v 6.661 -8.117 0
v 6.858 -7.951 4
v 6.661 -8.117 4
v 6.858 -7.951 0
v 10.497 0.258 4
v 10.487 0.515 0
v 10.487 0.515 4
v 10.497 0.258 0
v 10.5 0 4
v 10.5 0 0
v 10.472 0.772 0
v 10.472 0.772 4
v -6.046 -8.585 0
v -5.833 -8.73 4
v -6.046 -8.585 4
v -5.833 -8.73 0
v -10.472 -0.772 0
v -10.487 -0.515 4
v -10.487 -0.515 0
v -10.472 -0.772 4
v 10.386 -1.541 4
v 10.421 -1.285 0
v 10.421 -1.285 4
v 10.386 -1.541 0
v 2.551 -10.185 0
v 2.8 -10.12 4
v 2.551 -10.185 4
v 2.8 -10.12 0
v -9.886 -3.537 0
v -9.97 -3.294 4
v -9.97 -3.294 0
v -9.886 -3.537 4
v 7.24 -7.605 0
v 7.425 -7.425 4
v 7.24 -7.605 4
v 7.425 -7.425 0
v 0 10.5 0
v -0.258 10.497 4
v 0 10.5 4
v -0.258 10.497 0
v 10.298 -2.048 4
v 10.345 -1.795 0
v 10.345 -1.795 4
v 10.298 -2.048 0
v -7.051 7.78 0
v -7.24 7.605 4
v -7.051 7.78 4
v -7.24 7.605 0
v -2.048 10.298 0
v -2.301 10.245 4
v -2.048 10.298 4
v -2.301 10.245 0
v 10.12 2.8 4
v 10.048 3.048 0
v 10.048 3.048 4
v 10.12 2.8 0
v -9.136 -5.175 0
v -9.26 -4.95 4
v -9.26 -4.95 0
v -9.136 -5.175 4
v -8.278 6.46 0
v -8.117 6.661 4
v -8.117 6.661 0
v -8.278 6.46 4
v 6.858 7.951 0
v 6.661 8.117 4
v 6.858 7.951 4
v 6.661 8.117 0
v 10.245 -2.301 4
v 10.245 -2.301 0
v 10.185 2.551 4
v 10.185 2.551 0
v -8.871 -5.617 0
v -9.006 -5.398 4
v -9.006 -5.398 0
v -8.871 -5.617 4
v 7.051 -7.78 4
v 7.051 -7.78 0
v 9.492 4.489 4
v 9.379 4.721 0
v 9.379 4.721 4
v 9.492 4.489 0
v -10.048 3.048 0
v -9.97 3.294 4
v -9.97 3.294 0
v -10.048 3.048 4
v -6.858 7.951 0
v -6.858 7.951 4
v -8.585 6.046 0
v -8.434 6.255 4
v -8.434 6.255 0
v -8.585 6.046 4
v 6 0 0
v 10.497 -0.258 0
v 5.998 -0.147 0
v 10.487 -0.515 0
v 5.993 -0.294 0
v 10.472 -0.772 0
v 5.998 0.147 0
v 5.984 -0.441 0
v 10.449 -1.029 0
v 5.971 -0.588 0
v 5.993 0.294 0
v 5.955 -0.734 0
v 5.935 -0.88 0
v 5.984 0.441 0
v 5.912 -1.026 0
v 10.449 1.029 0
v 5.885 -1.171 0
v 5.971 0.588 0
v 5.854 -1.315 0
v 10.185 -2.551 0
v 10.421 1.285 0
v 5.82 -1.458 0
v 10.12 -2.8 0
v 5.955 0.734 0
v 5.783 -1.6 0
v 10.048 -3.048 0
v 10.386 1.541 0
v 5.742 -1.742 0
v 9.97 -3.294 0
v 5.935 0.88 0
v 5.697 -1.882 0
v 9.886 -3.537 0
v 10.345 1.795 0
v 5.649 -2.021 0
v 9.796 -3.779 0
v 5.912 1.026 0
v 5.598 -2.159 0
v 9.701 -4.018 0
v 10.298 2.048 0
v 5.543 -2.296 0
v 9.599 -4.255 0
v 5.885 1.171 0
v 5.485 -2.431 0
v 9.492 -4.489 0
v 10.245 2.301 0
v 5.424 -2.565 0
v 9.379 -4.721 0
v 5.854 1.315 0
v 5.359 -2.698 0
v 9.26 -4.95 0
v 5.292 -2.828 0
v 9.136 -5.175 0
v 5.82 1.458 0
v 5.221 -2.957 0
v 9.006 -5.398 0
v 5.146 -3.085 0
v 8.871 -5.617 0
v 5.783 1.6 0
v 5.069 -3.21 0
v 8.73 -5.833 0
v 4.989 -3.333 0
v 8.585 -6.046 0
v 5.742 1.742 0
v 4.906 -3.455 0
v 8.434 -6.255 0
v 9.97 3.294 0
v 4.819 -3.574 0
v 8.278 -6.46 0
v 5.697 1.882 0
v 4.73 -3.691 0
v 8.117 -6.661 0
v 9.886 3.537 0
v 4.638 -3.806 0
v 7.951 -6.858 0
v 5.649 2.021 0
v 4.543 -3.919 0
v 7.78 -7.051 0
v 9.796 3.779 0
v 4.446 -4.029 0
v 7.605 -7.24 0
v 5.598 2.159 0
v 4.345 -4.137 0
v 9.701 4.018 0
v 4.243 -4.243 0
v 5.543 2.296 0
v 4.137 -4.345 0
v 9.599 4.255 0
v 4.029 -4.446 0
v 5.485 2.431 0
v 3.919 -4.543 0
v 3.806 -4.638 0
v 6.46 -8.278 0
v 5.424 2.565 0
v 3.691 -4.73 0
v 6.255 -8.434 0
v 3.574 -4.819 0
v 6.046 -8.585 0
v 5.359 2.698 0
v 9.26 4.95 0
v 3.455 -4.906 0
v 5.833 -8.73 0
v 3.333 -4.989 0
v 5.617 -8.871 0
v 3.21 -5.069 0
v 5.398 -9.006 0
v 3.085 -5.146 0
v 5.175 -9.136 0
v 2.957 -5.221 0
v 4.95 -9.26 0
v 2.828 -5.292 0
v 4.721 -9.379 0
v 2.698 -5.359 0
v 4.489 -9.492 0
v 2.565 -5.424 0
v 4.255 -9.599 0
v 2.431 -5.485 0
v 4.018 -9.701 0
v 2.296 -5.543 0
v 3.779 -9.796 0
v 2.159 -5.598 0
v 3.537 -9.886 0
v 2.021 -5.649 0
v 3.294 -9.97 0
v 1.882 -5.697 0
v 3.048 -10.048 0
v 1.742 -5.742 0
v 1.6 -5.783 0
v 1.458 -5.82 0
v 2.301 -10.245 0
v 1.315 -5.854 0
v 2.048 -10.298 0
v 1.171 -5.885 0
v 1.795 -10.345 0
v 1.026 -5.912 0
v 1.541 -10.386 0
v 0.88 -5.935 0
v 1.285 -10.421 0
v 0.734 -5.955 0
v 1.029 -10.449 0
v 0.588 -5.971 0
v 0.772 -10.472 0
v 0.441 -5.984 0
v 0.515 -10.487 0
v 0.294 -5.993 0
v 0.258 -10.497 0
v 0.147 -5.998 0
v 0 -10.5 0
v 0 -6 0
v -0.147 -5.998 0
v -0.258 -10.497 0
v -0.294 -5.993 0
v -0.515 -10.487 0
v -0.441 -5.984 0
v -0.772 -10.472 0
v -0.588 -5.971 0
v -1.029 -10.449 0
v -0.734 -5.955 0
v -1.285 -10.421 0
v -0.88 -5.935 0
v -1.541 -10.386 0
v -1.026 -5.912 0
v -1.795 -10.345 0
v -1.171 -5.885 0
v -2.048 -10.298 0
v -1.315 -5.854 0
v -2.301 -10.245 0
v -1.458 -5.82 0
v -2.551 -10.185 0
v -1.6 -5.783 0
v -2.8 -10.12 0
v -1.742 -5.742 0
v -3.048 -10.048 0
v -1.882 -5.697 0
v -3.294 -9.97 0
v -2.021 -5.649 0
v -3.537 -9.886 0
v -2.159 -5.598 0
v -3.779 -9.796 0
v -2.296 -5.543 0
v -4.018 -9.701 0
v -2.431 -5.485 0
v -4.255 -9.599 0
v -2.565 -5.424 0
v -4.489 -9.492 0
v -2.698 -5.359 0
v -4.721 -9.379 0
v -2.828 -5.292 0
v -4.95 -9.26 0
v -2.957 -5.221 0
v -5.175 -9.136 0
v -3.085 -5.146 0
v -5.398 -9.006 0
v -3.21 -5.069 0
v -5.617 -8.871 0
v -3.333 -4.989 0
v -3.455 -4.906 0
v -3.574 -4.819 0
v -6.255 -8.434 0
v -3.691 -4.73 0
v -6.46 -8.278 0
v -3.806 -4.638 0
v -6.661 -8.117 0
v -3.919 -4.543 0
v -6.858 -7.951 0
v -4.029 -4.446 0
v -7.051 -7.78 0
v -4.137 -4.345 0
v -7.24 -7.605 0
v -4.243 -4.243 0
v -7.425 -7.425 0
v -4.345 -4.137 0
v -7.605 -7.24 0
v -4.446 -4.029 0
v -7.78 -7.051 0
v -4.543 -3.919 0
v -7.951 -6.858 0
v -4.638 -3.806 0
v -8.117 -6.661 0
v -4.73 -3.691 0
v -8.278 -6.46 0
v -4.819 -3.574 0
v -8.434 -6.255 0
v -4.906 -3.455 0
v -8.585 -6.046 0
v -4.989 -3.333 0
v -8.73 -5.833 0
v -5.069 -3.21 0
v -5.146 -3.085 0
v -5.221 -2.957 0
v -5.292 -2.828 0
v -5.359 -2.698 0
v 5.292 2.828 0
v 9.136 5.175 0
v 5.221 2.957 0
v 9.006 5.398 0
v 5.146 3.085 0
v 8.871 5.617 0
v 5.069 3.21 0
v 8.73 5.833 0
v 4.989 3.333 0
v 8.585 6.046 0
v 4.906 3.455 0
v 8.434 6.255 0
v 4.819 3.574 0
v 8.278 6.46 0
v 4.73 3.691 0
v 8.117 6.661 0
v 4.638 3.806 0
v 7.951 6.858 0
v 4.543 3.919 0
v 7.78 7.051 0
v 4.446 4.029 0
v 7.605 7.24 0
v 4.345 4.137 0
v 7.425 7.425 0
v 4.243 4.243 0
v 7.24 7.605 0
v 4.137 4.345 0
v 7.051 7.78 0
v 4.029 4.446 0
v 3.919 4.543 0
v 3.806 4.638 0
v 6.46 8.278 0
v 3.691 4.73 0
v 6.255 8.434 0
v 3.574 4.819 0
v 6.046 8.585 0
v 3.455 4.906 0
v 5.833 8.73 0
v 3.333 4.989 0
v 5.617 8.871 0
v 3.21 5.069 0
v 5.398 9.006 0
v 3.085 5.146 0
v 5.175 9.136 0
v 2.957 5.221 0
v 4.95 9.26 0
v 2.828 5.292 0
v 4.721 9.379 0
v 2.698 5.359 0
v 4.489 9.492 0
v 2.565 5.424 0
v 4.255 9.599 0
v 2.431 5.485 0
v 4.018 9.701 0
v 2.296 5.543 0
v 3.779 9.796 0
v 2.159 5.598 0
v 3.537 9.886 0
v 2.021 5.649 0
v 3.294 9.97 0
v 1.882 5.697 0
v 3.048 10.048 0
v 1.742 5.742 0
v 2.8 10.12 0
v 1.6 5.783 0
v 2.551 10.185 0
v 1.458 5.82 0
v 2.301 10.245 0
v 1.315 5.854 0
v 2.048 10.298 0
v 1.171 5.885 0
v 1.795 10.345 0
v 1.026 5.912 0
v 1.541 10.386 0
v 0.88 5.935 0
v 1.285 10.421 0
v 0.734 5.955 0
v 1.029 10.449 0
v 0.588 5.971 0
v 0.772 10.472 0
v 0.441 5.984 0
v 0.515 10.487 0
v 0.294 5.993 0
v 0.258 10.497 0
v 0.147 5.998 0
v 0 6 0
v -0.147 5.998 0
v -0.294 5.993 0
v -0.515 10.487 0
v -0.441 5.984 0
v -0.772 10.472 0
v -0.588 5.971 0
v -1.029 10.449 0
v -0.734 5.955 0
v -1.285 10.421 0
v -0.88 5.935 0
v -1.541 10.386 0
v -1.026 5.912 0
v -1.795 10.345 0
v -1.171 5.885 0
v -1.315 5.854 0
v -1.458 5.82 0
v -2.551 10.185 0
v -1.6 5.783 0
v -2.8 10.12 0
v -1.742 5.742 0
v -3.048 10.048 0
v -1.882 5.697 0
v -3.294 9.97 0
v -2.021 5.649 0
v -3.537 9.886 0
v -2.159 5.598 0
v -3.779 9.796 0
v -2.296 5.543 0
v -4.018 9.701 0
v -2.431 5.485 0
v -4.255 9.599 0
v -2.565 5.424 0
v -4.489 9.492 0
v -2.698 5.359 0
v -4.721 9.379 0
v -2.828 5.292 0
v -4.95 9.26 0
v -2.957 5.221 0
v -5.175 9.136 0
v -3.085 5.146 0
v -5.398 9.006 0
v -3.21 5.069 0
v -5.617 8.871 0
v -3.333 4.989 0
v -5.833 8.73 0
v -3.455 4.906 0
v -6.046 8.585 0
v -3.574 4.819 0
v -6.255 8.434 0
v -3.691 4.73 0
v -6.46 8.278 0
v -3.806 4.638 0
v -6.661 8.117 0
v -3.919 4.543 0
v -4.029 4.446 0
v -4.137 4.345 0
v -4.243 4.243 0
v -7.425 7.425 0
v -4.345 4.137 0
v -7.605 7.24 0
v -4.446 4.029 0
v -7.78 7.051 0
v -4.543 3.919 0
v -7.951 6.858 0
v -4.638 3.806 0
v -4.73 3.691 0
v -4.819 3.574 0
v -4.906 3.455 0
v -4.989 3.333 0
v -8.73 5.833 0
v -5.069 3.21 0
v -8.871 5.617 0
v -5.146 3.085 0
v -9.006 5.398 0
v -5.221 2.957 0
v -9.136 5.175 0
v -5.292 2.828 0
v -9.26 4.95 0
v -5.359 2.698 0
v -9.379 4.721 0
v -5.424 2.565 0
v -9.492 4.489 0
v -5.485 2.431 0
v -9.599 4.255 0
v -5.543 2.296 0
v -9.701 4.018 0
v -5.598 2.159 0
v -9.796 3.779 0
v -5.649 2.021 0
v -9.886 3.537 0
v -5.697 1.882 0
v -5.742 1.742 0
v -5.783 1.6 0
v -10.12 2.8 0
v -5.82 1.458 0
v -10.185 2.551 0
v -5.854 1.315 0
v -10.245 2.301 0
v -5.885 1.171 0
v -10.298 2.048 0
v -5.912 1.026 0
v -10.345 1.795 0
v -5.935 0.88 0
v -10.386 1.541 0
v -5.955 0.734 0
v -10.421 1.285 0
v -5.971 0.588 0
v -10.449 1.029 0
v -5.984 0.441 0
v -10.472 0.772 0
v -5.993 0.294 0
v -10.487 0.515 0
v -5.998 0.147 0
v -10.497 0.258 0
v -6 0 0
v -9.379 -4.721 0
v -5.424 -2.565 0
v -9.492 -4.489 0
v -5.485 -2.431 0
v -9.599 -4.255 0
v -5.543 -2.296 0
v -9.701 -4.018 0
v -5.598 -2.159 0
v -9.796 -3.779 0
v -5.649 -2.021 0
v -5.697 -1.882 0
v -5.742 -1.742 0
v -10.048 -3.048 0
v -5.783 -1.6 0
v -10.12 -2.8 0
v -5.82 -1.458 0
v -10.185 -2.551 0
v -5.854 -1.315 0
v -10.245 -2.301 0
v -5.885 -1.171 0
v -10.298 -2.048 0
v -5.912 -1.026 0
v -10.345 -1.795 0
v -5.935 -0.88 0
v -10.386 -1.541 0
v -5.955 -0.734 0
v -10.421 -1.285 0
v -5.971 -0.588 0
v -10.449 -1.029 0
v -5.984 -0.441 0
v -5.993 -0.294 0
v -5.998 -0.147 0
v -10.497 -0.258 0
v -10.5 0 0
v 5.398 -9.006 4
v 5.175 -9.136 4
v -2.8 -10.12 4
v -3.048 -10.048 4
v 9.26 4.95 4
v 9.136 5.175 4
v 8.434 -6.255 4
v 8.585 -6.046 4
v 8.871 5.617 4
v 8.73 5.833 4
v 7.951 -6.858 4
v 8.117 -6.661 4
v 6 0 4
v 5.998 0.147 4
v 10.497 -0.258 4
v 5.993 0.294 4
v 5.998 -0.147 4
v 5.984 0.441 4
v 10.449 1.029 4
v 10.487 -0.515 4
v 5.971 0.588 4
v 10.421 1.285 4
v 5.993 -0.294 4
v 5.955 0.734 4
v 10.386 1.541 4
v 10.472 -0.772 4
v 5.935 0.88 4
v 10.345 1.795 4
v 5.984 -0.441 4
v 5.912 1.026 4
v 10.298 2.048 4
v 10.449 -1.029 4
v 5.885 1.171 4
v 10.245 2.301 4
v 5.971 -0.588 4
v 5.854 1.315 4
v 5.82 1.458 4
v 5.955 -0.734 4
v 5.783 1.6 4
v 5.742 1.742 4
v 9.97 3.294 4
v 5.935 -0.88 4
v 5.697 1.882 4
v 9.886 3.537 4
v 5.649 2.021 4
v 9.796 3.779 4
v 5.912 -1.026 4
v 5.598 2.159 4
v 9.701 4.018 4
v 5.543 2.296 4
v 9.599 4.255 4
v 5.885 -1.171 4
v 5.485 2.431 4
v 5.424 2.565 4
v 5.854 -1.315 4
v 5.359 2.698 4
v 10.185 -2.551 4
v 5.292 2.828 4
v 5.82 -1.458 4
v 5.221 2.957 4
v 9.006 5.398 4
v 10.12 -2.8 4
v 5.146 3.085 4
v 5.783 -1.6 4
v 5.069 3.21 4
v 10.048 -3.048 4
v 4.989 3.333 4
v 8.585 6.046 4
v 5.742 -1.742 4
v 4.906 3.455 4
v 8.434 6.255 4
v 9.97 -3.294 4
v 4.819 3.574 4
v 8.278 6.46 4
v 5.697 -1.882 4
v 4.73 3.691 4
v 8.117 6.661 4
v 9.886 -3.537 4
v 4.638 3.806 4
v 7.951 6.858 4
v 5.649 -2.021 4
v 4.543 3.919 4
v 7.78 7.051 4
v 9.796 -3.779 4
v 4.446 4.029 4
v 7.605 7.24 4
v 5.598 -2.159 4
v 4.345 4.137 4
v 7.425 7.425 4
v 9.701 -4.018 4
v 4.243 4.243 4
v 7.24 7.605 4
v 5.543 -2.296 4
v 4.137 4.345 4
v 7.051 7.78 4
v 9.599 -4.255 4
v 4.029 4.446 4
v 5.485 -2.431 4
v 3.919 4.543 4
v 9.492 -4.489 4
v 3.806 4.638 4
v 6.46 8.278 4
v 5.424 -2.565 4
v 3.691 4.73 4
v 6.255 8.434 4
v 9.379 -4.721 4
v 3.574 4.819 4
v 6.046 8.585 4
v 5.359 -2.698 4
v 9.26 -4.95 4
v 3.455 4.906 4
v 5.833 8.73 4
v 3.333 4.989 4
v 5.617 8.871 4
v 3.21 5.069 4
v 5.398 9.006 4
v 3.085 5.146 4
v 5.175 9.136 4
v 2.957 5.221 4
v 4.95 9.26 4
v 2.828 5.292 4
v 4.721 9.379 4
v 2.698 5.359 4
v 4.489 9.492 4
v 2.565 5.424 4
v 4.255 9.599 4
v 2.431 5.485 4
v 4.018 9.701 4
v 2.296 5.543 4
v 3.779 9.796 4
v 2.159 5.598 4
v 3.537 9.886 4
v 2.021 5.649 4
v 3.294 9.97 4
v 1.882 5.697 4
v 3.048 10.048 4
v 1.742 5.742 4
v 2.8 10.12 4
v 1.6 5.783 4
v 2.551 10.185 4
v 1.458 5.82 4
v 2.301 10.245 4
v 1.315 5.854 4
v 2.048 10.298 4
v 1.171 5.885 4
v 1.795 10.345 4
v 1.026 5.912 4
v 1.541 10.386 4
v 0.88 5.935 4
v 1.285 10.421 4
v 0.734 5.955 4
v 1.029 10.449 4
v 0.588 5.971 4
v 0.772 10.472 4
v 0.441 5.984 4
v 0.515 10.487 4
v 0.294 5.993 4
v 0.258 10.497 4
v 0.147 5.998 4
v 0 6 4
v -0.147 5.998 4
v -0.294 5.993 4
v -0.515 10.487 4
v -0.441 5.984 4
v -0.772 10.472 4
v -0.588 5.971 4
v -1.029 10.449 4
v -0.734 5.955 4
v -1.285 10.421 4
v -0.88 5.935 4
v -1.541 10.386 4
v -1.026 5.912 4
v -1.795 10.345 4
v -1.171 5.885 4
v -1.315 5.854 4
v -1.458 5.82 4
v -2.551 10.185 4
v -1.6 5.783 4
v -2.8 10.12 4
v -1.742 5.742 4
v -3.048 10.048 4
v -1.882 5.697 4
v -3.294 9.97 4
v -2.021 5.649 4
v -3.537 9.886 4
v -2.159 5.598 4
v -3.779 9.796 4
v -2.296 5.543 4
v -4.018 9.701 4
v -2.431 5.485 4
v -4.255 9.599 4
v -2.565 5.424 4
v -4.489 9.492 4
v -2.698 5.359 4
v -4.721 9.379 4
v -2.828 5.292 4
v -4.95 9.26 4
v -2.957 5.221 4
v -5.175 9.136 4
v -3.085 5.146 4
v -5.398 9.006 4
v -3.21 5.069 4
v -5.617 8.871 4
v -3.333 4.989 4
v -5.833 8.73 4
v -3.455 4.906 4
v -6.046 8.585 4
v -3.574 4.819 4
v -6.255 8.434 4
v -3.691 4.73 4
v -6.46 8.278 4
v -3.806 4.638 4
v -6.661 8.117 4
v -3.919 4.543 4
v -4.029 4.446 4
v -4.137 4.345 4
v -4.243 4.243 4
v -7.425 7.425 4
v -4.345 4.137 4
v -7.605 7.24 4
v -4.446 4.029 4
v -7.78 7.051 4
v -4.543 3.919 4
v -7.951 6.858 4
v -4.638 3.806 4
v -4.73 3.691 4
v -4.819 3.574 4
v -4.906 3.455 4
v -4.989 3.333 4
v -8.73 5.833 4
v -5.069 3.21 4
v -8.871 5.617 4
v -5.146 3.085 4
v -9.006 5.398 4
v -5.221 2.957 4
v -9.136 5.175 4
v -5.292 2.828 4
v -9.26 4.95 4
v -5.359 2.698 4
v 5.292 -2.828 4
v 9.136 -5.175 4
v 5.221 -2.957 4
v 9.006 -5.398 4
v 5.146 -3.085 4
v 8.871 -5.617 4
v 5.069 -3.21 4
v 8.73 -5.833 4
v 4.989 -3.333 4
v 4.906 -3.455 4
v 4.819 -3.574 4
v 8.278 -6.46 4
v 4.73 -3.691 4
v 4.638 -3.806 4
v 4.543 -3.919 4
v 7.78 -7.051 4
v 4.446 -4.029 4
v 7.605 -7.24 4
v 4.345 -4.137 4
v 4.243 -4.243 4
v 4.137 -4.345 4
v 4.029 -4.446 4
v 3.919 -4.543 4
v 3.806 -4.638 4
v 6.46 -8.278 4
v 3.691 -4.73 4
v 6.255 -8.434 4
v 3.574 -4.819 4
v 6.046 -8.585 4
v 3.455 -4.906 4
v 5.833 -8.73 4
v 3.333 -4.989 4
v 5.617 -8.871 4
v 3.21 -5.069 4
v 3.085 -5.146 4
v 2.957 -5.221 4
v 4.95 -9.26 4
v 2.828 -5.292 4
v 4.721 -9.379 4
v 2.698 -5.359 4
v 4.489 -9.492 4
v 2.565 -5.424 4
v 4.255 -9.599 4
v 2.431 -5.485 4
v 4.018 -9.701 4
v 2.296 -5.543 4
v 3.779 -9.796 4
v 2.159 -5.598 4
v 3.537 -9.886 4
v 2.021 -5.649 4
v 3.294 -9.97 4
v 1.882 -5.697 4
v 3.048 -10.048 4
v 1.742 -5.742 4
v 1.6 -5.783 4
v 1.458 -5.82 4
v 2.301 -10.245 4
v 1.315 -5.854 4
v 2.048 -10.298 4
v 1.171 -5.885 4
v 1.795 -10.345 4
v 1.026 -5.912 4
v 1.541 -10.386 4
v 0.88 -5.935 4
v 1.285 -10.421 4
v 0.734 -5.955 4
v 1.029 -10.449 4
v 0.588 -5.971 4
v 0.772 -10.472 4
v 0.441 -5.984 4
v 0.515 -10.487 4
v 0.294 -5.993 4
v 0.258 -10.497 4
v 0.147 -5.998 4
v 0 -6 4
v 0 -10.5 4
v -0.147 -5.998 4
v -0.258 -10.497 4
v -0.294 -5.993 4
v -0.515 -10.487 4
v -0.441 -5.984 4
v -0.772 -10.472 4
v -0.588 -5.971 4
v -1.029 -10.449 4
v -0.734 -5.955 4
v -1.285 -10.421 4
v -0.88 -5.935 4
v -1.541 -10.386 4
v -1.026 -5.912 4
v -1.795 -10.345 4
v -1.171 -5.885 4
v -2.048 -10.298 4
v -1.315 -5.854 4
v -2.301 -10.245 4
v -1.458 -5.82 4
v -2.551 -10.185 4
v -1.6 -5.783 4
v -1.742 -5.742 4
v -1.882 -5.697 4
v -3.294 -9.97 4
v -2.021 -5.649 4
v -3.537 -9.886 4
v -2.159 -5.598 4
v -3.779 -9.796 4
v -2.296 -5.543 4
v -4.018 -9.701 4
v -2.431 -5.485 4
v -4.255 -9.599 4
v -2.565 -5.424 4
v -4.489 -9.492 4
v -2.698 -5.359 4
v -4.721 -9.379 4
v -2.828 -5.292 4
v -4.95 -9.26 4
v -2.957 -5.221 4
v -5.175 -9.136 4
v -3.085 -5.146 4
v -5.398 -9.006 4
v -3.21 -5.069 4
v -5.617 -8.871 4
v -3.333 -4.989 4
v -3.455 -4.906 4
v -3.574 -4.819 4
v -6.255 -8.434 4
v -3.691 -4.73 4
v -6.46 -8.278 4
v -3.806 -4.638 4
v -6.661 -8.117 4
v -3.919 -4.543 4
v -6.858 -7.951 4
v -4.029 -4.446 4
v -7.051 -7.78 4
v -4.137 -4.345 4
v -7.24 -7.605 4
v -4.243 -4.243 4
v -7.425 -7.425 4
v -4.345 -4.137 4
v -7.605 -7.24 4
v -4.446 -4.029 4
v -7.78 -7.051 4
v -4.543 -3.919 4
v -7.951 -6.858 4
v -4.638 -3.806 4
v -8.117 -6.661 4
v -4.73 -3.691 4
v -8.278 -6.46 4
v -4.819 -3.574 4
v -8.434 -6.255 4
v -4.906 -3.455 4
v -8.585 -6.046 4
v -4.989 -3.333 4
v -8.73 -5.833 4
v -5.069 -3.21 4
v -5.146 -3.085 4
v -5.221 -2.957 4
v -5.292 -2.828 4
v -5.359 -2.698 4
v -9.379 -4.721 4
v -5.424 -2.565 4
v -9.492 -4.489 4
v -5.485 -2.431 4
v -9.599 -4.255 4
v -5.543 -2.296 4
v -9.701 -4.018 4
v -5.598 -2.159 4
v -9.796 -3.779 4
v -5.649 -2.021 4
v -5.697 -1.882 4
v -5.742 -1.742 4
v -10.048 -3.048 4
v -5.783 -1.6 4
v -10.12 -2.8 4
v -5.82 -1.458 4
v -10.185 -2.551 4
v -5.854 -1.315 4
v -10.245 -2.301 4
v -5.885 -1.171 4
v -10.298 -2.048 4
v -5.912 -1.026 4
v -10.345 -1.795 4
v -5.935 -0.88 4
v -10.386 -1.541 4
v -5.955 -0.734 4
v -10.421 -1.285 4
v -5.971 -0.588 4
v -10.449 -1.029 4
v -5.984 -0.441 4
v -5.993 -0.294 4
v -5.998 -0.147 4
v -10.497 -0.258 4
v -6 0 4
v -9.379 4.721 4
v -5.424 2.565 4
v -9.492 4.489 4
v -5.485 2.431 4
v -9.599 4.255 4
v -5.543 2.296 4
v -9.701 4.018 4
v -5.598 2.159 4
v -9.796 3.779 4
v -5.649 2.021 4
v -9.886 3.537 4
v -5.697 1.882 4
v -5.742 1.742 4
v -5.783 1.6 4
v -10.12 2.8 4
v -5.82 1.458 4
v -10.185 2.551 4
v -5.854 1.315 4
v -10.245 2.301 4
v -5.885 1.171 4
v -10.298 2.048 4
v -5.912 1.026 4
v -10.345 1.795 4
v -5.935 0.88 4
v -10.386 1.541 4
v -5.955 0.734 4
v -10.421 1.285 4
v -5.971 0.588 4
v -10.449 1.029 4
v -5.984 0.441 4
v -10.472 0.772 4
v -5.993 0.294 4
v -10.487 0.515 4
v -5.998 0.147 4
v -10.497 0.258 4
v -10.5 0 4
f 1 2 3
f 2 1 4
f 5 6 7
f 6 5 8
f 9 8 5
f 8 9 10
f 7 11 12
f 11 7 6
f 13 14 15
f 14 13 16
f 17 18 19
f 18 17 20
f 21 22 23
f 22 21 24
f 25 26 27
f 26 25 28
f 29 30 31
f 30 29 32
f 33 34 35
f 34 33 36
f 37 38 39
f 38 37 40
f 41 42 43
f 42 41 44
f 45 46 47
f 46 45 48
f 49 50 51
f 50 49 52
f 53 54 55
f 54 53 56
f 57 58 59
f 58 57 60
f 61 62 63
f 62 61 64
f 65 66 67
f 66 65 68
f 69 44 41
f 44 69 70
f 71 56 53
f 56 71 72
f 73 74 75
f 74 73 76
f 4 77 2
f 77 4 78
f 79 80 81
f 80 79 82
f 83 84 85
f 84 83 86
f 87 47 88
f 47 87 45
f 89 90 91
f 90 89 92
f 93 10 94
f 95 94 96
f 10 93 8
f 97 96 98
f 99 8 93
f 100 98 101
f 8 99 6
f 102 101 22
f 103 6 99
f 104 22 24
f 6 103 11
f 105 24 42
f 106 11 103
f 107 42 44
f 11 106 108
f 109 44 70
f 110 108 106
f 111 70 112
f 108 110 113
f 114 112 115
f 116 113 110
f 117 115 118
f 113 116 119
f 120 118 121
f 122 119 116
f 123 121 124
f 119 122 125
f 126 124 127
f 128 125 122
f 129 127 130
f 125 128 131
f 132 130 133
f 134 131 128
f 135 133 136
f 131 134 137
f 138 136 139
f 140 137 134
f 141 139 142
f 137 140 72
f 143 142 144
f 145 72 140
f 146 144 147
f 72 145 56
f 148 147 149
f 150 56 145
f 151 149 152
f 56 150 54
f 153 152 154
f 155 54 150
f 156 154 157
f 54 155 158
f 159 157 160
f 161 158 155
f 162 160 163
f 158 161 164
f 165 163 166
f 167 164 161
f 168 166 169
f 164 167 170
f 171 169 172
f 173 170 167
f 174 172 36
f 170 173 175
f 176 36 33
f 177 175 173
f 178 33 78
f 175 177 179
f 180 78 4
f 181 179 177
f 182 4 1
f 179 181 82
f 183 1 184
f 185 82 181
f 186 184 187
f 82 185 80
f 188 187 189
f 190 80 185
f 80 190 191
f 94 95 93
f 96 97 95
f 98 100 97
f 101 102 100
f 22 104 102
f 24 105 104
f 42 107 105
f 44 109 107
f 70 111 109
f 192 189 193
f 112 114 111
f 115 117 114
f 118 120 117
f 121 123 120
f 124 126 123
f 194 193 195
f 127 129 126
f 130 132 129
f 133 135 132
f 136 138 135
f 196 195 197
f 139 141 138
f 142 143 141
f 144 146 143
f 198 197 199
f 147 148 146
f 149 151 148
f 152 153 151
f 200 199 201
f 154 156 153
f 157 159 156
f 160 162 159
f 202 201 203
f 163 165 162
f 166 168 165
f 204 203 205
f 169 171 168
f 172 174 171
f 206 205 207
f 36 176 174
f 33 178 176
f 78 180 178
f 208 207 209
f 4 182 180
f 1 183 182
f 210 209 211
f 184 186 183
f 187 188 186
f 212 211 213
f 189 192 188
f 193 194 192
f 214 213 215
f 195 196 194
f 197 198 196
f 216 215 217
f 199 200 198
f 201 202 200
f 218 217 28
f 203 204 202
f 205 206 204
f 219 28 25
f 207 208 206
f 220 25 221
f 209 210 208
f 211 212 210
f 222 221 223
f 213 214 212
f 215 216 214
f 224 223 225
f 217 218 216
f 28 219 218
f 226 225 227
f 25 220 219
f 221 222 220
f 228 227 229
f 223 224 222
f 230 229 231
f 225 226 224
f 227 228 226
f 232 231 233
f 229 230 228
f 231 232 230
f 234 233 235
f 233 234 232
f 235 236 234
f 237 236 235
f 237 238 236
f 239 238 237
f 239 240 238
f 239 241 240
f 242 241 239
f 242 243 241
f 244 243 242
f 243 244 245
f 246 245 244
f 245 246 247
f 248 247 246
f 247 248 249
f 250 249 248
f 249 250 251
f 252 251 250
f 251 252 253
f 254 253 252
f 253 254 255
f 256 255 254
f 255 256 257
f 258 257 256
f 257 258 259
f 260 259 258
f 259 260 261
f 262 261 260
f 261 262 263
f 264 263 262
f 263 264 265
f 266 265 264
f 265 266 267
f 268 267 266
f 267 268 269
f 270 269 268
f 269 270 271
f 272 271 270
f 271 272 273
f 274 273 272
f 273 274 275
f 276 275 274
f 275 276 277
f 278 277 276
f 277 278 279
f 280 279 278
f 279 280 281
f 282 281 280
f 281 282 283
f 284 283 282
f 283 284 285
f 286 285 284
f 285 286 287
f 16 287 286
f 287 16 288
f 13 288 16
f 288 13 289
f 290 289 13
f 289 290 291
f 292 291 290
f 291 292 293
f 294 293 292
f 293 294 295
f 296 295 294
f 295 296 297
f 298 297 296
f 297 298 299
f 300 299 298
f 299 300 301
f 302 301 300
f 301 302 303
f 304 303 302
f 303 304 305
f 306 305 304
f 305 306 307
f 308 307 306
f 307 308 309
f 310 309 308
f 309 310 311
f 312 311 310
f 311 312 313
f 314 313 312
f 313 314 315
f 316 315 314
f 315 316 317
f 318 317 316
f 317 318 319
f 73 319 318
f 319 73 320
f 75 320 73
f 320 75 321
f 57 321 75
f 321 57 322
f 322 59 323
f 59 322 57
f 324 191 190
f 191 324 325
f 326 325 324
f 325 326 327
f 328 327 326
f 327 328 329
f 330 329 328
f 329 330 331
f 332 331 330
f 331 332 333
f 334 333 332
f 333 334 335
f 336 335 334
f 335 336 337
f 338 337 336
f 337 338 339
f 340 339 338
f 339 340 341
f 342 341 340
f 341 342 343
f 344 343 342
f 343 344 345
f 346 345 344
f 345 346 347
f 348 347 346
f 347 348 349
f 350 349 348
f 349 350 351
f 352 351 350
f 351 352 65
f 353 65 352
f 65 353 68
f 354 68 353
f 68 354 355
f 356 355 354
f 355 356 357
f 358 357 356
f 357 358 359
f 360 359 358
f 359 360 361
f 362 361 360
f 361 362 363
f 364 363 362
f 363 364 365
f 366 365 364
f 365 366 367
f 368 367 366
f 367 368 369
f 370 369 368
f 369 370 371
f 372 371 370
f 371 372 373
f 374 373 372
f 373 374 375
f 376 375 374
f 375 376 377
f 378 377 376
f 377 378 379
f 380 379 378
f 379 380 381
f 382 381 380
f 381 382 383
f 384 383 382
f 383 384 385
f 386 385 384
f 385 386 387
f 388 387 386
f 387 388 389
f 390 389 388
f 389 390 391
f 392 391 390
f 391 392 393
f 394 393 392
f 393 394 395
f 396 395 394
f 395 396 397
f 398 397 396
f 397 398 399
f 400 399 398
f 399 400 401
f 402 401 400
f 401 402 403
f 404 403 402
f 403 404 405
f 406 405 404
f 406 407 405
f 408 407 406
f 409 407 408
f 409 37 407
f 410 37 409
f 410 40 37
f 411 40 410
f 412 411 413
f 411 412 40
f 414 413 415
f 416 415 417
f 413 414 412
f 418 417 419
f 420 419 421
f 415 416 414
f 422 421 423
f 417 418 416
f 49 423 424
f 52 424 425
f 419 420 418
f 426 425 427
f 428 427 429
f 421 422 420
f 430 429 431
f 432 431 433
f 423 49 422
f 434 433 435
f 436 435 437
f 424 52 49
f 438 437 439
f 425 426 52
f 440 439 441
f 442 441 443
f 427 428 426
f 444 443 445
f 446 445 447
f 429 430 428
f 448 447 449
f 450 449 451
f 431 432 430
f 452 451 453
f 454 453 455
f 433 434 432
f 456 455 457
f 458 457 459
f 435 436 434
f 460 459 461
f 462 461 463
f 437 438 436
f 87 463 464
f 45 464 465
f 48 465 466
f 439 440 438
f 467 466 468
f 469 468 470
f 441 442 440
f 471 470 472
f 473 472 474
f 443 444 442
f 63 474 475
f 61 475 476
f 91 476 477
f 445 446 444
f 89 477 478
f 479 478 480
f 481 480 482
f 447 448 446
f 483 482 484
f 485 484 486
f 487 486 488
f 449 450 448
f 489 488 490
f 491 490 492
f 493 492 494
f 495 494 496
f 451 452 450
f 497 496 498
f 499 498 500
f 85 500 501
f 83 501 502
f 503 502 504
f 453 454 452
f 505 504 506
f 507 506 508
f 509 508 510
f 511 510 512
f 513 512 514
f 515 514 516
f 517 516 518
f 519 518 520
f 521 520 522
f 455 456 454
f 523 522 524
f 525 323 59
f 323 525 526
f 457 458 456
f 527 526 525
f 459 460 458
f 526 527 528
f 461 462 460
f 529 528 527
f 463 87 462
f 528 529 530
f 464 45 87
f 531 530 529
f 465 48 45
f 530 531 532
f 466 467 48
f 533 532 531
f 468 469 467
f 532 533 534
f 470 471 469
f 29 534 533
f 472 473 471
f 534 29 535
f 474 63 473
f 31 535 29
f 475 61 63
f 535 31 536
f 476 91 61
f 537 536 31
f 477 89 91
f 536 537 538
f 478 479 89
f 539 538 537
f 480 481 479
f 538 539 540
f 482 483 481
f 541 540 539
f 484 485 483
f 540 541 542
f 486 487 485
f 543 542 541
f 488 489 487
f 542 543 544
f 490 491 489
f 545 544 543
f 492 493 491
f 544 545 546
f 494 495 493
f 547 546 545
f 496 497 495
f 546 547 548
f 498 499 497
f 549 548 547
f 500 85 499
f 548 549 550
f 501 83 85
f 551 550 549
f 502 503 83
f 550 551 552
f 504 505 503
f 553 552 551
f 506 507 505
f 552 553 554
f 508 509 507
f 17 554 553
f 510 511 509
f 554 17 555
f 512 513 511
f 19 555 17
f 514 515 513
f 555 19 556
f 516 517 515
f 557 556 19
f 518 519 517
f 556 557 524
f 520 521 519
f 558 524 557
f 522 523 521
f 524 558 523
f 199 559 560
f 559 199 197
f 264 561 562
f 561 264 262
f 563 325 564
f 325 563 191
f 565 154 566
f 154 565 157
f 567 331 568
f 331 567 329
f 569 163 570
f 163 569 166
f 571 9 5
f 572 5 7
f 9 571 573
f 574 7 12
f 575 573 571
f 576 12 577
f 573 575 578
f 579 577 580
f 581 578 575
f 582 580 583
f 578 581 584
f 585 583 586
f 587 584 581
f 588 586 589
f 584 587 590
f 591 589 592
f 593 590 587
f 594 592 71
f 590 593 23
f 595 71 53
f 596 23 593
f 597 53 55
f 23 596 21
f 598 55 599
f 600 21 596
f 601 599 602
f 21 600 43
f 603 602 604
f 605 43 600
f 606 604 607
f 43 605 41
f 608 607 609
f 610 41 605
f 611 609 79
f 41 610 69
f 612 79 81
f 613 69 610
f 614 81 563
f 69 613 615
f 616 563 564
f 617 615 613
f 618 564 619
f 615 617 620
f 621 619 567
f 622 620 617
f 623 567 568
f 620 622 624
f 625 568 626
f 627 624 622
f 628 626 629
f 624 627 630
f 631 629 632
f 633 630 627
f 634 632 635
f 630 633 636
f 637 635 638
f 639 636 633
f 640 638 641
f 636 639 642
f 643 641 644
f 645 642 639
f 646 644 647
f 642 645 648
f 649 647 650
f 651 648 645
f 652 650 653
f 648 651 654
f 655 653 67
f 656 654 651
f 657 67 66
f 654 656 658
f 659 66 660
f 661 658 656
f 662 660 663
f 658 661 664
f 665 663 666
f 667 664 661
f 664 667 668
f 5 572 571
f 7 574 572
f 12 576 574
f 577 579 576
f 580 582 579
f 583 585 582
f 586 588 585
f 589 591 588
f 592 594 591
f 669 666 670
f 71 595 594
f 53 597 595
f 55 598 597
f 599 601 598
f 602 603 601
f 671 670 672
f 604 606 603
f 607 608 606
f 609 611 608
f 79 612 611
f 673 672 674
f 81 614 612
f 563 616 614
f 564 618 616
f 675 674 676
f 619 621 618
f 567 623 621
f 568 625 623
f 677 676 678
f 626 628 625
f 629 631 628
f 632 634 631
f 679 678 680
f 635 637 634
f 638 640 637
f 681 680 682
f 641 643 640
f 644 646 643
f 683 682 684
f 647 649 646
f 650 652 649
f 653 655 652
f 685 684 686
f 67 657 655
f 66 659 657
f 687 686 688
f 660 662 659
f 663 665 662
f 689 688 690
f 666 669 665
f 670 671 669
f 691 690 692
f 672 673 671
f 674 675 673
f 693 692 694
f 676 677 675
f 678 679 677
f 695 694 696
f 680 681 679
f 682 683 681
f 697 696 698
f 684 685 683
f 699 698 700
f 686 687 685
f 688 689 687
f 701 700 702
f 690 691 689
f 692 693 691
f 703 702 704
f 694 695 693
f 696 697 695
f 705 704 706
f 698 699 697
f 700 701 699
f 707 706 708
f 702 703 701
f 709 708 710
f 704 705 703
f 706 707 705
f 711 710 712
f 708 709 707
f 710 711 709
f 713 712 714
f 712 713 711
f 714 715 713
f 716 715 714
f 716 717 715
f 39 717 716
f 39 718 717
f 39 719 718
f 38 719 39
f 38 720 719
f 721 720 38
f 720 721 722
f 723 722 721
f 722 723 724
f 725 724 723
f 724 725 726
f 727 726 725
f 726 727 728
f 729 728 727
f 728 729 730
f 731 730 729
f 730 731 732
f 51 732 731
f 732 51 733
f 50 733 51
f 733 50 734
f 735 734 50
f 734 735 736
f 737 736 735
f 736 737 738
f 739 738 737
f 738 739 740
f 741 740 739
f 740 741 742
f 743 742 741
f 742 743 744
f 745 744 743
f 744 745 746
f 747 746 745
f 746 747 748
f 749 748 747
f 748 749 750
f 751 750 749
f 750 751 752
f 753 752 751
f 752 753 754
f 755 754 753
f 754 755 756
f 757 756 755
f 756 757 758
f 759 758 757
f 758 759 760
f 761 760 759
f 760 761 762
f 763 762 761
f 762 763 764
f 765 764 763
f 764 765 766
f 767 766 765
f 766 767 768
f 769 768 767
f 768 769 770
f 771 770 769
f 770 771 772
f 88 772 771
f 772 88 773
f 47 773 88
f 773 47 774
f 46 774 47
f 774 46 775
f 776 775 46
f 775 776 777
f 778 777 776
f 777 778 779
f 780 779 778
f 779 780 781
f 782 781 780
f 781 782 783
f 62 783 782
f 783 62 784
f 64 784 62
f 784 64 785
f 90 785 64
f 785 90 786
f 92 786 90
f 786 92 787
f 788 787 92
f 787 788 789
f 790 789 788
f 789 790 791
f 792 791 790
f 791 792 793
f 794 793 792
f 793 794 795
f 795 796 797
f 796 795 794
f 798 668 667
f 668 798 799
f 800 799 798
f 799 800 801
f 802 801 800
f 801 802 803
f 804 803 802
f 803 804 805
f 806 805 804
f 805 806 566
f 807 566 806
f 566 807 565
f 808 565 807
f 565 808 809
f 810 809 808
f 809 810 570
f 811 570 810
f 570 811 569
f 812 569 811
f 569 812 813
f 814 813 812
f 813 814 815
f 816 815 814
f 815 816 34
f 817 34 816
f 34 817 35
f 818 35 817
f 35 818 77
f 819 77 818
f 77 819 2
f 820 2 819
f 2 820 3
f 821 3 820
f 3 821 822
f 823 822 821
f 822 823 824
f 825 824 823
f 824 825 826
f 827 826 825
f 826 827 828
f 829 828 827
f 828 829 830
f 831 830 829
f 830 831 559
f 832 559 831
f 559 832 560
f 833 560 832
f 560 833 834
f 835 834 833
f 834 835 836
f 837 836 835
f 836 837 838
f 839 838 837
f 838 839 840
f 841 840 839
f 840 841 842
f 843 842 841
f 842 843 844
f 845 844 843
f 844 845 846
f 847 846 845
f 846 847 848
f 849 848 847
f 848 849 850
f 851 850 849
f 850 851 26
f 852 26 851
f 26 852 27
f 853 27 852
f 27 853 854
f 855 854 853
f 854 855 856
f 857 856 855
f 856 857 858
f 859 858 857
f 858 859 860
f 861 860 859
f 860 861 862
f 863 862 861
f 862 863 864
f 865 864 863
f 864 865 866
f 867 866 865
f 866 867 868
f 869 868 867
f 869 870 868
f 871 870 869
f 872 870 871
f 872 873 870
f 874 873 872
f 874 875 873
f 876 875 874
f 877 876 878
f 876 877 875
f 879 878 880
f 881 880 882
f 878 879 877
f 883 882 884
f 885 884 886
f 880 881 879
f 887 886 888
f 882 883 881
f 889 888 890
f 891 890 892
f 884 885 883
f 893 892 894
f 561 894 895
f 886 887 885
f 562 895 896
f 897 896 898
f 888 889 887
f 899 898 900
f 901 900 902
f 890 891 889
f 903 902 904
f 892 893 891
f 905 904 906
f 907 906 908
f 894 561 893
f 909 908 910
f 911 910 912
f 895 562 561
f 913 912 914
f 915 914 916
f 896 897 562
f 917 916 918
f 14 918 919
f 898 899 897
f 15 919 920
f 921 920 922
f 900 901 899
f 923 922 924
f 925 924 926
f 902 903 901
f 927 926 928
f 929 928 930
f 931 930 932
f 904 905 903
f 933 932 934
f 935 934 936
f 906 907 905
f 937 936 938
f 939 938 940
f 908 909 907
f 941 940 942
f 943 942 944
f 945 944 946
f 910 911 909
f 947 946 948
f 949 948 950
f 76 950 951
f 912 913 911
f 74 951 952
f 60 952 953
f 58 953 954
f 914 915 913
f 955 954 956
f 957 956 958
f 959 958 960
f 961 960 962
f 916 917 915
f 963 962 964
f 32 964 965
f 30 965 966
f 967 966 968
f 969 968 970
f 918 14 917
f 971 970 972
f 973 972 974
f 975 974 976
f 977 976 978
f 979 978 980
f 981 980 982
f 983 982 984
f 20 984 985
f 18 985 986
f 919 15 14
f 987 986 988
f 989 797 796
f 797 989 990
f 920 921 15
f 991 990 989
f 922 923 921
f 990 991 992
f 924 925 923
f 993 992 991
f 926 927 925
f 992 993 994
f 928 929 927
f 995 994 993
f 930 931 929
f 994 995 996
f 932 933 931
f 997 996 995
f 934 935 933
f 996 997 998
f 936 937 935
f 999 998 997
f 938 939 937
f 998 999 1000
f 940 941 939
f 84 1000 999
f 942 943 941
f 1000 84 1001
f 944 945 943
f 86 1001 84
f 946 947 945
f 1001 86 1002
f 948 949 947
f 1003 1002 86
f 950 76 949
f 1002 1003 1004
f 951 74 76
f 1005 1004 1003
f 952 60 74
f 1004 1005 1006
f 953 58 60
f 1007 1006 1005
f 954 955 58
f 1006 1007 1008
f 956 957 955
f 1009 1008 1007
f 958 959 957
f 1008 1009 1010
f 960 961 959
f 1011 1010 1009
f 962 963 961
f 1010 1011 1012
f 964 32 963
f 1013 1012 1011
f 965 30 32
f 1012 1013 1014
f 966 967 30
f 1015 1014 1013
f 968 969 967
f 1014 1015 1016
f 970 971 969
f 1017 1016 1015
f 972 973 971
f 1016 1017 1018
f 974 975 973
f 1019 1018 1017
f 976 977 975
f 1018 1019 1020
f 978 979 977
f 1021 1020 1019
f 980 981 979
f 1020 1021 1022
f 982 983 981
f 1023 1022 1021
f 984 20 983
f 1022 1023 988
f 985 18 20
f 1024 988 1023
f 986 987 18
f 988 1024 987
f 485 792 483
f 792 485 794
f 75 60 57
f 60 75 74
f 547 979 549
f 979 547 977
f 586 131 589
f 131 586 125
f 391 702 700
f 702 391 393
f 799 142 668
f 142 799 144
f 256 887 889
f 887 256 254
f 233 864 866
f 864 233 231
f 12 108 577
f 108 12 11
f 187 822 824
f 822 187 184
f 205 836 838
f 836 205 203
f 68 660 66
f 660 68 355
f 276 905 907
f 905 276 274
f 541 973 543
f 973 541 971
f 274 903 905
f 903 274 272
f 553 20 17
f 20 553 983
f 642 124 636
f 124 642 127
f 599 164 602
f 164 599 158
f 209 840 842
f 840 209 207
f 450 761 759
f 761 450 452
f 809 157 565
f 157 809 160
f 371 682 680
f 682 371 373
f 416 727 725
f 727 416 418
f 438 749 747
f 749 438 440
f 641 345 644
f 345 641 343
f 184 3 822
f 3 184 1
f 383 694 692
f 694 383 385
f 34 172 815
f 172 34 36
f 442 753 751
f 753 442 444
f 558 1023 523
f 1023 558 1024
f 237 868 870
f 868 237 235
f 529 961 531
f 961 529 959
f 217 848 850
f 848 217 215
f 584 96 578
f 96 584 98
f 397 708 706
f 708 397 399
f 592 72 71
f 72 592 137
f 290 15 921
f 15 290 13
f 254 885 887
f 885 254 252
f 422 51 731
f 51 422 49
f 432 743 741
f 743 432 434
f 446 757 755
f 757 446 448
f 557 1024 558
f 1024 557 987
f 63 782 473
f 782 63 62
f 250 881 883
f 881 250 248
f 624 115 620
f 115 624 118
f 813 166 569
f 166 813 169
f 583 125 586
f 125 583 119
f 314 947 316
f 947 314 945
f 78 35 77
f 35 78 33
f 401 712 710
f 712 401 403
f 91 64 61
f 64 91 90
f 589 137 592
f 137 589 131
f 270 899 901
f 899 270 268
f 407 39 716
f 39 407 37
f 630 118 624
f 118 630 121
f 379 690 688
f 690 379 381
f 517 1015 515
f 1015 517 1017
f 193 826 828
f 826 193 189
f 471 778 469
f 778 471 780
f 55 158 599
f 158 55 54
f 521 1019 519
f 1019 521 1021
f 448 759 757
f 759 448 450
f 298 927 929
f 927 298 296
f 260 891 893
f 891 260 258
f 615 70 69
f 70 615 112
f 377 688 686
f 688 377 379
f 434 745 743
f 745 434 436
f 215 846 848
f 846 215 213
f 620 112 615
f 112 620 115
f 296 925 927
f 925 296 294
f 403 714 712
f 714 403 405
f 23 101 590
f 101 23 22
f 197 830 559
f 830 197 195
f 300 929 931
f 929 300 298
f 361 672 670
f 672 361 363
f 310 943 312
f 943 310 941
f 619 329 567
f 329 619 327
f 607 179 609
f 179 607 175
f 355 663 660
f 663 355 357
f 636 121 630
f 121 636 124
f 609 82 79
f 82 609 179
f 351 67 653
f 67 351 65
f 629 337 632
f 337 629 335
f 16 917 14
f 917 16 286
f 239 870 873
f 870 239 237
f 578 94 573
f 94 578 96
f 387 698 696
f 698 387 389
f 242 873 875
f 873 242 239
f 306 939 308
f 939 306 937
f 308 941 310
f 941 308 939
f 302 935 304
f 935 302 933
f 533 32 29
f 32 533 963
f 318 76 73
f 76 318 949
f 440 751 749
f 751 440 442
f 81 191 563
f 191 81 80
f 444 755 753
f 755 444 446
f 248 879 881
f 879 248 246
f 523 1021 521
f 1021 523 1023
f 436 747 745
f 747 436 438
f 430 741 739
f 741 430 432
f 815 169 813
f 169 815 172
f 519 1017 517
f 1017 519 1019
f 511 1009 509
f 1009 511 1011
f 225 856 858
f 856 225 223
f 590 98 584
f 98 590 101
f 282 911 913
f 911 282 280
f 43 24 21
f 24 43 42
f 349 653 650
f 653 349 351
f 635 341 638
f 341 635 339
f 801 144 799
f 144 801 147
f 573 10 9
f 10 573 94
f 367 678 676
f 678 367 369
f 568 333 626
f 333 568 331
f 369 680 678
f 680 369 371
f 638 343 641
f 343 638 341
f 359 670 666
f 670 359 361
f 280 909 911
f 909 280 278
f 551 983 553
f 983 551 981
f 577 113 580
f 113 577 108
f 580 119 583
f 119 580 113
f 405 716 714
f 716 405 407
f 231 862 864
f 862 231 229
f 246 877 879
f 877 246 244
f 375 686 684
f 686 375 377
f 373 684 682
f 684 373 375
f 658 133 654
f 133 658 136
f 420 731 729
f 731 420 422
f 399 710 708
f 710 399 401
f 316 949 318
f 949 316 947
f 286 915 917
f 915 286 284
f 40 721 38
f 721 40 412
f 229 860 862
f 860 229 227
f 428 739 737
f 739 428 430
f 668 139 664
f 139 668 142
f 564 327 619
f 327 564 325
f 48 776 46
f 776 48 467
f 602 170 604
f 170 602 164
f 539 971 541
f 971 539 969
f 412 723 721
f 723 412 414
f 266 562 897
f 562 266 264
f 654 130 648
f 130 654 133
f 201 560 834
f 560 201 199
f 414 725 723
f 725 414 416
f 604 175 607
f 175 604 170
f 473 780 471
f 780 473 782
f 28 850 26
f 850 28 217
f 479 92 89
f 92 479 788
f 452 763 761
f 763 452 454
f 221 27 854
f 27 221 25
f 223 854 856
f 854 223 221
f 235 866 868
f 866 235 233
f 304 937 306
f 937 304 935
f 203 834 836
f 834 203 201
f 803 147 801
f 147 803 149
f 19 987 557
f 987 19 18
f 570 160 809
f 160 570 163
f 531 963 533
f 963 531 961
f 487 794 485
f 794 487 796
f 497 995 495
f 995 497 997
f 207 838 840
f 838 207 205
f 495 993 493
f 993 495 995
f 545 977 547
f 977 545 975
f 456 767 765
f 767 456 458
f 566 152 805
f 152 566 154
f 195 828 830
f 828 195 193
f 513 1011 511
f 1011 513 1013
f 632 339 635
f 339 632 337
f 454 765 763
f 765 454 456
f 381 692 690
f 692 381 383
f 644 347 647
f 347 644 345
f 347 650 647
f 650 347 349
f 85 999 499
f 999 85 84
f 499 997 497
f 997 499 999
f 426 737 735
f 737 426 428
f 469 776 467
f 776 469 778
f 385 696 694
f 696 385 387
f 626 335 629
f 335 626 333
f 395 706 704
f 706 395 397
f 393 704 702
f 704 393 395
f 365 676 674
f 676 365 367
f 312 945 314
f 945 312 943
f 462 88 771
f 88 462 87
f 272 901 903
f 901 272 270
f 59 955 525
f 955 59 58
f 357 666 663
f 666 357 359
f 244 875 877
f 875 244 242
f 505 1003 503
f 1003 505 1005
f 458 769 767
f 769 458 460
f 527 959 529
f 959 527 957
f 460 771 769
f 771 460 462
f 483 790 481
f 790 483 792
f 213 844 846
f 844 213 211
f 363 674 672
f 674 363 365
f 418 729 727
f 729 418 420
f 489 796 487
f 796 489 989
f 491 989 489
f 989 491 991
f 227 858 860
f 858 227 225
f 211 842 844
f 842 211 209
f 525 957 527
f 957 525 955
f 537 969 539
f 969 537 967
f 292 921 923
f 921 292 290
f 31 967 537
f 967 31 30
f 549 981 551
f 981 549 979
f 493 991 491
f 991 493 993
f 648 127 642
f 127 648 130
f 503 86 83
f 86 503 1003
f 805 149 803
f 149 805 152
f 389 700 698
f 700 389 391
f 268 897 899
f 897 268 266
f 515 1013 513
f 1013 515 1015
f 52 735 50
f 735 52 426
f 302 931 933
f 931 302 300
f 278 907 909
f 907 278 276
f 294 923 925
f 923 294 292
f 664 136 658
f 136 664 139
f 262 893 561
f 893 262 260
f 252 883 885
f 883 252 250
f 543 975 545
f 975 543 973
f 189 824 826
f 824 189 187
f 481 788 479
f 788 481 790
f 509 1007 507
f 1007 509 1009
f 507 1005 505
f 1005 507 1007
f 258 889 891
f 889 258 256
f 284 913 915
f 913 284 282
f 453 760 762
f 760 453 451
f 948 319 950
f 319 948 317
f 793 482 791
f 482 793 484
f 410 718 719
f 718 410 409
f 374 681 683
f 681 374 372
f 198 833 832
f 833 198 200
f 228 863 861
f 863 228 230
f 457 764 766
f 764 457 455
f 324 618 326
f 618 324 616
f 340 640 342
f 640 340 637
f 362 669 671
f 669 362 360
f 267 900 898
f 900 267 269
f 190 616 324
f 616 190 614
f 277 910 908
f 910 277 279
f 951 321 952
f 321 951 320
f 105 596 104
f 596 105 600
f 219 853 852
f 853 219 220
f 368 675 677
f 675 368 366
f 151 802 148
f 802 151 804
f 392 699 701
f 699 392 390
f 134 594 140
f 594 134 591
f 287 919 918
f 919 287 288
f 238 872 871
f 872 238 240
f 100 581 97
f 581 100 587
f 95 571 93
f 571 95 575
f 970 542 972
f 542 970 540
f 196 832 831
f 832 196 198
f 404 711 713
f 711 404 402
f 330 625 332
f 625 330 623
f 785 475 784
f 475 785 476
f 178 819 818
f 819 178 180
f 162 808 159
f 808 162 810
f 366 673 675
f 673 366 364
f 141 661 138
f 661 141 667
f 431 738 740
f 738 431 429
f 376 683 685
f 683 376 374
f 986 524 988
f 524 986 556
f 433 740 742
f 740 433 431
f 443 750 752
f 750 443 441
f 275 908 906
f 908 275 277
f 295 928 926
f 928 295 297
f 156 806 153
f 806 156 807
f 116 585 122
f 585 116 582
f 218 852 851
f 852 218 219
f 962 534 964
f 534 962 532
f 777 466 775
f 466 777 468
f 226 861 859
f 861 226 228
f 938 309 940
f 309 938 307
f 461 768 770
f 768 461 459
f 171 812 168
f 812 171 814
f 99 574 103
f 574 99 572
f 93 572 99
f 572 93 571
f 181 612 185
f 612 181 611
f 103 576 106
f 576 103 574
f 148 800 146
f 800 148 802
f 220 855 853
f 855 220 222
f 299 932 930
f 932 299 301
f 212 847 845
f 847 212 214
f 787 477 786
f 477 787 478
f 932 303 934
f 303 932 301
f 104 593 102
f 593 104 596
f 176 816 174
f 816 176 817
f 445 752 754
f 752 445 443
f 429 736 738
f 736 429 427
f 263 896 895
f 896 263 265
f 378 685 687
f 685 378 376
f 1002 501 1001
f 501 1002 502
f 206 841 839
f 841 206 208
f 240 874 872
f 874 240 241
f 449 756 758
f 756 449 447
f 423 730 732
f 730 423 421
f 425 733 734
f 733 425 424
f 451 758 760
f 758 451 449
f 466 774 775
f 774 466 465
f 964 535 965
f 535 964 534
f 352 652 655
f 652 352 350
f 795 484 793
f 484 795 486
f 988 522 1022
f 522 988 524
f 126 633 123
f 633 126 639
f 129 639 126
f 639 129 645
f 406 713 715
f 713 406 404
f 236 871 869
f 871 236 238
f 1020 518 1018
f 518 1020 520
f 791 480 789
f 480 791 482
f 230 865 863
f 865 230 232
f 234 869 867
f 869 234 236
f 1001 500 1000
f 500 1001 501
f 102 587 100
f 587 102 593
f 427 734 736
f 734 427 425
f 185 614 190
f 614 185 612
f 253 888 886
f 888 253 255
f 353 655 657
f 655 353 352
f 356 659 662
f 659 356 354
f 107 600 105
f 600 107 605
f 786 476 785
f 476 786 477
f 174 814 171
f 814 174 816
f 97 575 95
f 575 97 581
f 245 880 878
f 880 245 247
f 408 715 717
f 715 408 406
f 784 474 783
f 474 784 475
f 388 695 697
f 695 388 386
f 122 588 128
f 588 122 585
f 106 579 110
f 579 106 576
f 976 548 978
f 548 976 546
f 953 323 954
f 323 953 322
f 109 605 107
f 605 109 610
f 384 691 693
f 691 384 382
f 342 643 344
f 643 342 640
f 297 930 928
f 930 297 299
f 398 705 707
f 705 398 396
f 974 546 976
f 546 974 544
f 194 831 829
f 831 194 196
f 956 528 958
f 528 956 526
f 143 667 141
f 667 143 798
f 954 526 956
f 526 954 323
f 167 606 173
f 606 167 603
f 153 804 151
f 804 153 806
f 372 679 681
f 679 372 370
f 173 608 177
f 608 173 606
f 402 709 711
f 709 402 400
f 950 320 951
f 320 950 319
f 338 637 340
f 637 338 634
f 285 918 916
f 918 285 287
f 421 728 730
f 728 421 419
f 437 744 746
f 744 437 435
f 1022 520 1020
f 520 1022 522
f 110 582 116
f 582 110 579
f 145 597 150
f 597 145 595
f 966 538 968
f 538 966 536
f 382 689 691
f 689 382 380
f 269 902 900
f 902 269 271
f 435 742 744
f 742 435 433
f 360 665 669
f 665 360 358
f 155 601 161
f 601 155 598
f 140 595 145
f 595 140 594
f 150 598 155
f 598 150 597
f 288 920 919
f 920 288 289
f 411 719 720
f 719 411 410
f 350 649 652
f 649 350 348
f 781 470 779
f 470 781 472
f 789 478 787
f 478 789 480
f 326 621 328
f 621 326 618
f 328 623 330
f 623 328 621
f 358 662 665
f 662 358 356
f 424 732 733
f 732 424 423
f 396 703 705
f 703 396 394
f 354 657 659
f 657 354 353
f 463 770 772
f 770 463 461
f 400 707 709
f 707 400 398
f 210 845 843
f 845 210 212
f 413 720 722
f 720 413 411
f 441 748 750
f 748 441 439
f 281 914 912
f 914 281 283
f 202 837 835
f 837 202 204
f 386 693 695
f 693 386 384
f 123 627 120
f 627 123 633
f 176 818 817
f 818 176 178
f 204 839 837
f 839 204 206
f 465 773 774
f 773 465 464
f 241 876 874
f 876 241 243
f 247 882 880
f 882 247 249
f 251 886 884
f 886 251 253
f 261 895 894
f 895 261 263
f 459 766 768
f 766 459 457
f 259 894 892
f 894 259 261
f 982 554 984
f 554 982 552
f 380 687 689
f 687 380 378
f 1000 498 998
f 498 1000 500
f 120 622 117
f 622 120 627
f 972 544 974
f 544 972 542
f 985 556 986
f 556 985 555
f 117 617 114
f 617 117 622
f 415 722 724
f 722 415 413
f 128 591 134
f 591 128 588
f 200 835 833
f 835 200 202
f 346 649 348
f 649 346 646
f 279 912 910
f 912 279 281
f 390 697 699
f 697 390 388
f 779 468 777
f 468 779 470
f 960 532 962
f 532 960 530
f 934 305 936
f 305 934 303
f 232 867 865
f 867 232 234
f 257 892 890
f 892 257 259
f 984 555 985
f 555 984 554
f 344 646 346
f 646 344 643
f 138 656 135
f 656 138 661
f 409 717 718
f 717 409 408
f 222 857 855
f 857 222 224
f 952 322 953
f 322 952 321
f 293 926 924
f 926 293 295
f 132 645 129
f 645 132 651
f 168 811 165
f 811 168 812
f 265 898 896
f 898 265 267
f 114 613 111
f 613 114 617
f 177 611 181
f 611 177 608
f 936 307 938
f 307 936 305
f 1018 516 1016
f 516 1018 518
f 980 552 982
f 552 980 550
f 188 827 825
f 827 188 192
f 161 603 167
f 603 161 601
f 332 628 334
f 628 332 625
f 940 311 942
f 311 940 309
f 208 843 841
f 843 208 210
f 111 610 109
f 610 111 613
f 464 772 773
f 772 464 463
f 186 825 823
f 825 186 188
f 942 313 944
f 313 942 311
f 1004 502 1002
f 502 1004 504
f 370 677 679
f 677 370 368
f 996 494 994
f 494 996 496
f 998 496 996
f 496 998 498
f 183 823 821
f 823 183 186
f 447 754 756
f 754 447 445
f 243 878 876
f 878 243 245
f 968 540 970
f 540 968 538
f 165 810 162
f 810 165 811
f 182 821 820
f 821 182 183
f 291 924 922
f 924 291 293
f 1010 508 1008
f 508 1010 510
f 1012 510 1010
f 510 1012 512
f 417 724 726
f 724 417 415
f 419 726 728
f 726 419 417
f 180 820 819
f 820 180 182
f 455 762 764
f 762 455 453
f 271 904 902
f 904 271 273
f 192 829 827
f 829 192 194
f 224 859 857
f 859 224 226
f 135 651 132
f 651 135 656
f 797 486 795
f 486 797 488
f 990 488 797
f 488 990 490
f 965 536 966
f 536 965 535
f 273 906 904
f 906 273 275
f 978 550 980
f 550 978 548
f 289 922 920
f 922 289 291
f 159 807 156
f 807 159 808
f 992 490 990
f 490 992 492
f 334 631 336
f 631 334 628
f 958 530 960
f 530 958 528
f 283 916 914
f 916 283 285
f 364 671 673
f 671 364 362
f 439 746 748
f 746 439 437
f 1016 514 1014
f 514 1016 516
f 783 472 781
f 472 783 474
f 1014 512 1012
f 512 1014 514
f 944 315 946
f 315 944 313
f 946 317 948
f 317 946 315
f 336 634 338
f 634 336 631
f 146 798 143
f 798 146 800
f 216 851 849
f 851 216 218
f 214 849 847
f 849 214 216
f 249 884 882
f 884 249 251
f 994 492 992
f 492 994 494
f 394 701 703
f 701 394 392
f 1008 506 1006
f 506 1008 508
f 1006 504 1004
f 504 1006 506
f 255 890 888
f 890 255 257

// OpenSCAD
// file: christmas_pyramid_2.scad
include <base_objects.scad>


/*
  ideen: 
  Befestigung mit Rampamuffe / Einschraubmutter
  
  8 dec 2026: 25mm -> 30mm
*/

$fn=256;

arc_outer_height = 200;  // height of the arc
arc_outer_width = 220; // total outer width of the arc
arc_depth = 10;     // depth of the arc (not used for the tempate)
arc_thickness = 30;

milling_gap = 4.5;
milling_extension = 9; // thinkness of the template for the milling copy (Überstand Kopierhülse)
template_extra_size= 5;
template_target_extend = 9;     // height to hold the wood arc, should ca half the wood arc thinkness

/*
module ellipsoid(rx=30, ry=20, rz=10, $fn=100) {
    scale([rx, ry, rz]) sphere(r=1, $fn=$fn);
}
*/

/*
    h: Height of the arc
    w: base width of the arc
    z: thickness of the arc (z-axis), default: 1
    o: extra offset on height and width, default: 0
    
*/
module solid_arc(h=20, w=10, z=1, o=0) {
    difference() {
        scale([w/2+o,h+o, 1])
        cylinder(r=1,h=z, $fn=256);
        translate([0,0,-0.02])
        scale([2,2,2])
        translate([-w/2-o,-h-o,0])
        cube([w+o*2,h+o,z]);
    }
}


/*
  no need to print this part, this is just to see how it could look like
*/
module wood_arc() {
    difference() {
        solid_arc(w=arc_outer_width, h=arc_outer_height, z=arc_depth, o=0);
        translate([0,-0.01,-0.01])
        solid_arc(w=arc_outer_width, h=arc_outer_height, z=arc_depth+0.02, o=-arc_thickness);
    }
}

/*    
    M3: headdia=6, headheight=4
    M4: headdia=8, headheight=5
*/
module m3cut() {
    let(d=3, hd=d*2.3) {
        union() {
            cylinder(d1=d, d2=hd, h=(hd-d)/2);
            
            translate([0,0,(hd-d)/2-0.005])
            cylinder(d=hd, h=milling_extension);
            
            translate([0,0,-milling_extension*2])
            cylinder(d=3, h=milling_extension*4);
        }
    }
}


/*
    turn around template_1 and mill around the edges. 
    The lower ruler has to be placed at the edge of the wood
*/
module template_1() {
    let (r=30) {
        difference() {
            union() {
                solid_arc(w=arc_outer_width, h=arc_outer_height, z=milling_extension, o=-milling_gap);
                translate([(-arc_outer_width+milling_gap*2)/2, -r,0])
                cube([arc_outer_width-milling_gap*2, r, milling_extension+template_target_extend]);
            }

            translate([0,0,milling_extension])
            rotate([0,180,0]) {
                translate([ arc_outer_width*0.2, arc_outer_height*0.2,milling_extension/2])
                m3cut();
                translate([ -arc_outer_width*0.2, arc_outer_height*0.2,milling_extension/2])
                m3cut();
                translate([ 0, arc_outer_height*0.6,milling_extension/2])
                m3cut();
            }
        }
    }
}

module template_2() {
    difference() {
      translate([-(arc_outer_width+template_extra_size*2)/2,-template_extra_size,0])
      cube([arc_outer_width+template_extra_size*2,arc_outer_height+template_extra_size*2,milling_extension+template_target_extend]);
      
      translate([0,-0.01,-0.01])
      solid_arc(w=arc_outer_width, h=arc_outer_height, z=milling_extension+0.02, o=-arc_thickness+milling_gap);
      translate([0,-0.01,milling_extension])
      solid_arc(w=arc_outer_width, h=arc_outer_height, z=milling_extension+0.02, o=0);
      //wood_arc();
      translate([-(arc_outer_width-arc_thickness*2+milling_gap*2)/2,-template_extra_size*2-0.01,-0.01])
      cube([arc_outer_width-arc_thickness*2+milling_gap*2, template_extra_size*2+0.02, 2*milling_extension+0.02]);
        
      translate([0,0,milling_extension+template_target_extend])
      rotate([0,45,0])
      translate([-3,0,-3])
      cube([6,arc_outer_height*3, 6]);

      translate([arc_outer_width/2*0.9, arc_outer_height*0.9, 7])
      rotate([180,0,0])
      m3cut();

      translate([-arc_outer_width/2*0.9, arc_outer_height*0.9, 7])
      rotate([180,0,0])
      m3cut();

      translate([arc_outer_width/2*0.98, arc_outer_height*0.4, 7])
      rotate([180,0,0])
      m3cut();

      translate([-arc_outer_width/2*0.98, arc_outer_height*0.4, 7])
      rotate([180,0,0])
      m3cut();

      translate([-(arc_outer_width-arc_thickness)/2,-arc_outer_height*0.1,milling_extension+template_target_extend])
      rotate([0,45,0])
      translate([-3,0,-3])
      cube([6,arc_outer_height*0.2, 6]);

      translate([+(arc_outer_width-arc_thickness)/2,-arc_outer_height*0.1,milling_extension+template_target_extend])
      rotate([0,45,0])
      translate([-3,0,-3])
      cube([6,arc_outer_height*0.2, 6]);

    }
}

/*
translate([0,0,40])
wood_arc();
template_2();
*/
// main file
/*
    The idea is to have a tool, which allows to draw a line, which can be used 
    for precutting:
    
    Use part1 template 1:
        1. plase that template on a wood plate
        2. put a pen into the hole of the below tool and attach it to the template
        3. draw a line around the template. That line should have a distance of the 
            ring width around the template. The marks the milling edge and can
            be used for precutting
        4. With a saw follow the line, ensure to be outside the line all the time
        
*/

include <christmas_pyramid_2.scad>

inner_dia = 12;
outer_dia = inner_dia + milling_gap*2;

difference() {
    cylinder(d=outer_dia, h = 4);
    translate([0,0,-0.01])
    cylinder(d=inner_dia, h = 4.02);
}
